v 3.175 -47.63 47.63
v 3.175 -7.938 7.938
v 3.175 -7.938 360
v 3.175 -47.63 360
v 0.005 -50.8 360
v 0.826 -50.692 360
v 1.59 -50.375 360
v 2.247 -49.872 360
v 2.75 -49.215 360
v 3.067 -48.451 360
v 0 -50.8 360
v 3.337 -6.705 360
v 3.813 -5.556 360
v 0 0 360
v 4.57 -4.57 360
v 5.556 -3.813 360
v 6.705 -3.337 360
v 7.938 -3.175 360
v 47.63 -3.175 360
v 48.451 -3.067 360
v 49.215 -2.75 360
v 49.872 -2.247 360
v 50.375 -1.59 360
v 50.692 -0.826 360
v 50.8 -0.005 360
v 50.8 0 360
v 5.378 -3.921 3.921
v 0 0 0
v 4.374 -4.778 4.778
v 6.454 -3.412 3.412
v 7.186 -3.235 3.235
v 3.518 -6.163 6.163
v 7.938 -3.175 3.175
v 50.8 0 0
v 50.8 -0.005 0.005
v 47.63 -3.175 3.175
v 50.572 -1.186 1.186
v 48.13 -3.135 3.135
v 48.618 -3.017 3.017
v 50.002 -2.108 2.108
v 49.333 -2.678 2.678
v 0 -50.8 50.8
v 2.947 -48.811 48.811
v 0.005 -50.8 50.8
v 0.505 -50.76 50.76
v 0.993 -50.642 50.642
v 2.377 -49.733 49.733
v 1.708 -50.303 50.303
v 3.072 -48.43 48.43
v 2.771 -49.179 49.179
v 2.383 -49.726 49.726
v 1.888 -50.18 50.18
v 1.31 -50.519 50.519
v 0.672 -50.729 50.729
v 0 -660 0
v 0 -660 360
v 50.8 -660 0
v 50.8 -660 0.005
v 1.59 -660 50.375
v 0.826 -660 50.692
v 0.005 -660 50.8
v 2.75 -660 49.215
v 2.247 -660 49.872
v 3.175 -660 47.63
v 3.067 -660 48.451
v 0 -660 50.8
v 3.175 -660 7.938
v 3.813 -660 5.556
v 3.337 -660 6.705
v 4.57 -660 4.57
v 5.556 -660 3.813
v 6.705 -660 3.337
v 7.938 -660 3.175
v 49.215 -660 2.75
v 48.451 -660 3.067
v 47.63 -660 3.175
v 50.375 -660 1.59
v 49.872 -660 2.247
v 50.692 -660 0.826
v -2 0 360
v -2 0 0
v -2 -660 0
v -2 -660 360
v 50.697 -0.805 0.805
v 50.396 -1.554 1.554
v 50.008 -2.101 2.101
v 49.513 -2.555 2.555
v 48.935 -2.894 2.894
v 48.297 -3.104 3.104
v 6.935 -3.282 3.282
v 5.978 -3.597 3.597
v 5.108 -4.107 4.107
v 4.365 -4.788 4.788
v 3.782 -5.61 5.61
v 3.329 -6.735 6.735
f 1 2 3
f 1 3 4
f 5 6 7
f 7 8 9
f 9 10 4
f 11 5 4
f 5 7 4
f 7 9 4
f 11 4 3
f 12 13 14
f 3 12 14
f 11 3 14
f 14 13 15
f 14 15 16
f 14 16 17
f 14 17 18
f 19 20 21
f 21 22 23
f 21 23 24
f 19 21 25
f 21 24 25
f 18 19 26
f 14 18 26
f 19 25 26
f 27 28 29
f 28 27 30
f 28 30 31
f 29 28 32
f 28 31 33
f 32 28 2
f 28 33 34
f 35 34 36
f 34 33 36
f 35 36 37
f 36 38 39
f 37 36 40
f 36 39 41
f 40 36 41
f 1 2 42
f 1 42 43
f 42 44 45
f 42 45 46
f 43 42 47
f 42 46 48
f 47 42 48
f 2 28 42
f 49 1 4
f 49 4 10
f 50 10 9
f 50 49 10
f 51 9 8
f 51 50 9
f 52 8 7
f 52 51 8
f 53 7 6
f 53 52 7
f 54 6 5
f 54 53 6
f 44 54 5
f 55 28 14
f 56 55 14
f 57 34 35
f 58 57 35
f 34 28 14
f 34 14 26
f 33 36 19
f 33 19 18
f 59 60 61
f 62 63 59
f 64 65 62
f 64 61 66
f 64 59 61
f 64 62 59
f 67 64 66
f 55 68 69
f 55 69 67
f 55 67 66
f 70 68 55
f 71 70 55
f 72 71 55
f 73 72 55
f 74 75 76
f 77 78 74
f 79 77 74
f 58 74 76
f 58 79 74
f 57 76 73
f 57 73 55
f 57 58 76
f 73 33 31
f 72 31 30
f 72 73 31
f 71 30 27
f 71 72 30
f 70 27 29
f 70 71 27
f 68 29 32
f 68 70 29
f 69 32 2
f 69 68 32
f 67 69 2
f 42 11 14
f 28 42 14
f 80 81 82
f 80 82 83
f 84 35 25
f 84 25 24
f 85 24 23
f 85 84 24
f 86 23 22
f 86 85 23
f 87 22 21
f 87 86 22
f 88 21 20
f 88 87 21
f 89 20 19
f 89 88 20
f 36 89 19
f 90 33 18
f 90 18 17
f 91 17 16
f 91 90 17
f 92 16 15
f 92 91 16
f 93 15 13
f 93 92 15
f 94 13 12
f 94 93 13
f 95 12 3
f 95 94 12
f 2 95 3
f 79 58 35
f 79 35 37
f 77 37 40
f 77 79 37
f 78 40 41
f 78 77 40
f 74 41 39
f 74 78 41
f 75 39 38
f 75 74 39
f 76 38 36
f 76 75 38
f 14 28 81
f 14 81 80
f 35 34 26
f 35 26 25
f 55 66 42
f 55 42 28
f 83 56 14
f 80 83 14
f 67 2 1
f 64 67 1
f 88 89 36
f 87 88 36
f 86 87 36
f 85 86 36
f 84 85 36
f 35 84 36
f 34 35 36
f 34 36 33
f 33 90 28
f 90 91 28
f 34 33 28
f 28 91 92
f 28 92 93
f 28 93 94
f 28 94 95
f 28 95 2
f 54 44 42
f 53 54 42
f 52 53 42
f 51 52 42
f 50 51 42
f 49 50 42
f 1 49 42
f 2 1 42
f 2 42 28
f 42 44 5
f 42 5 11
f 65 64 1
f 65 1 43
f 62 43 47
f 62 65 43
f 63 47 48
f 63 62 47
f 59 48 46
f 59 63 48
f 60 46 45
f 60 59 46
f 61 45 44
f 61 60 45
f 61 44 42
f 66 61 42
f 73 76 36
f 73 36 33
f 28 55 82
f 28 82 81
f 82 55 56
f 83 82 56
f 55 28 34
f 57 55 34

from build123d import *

# Parameters (mm, degrees)
HIERRO_ANGULAR_2_X_2_X_0_125_1_DEPTH        = 732.842048969
HIERRO_ANGULAR_2_X_2_X_0_125_1_2_DEPTH      = 360
HIERRO_ANGULAR_2_X_2_X_0_125_1_2_DEPTH_BACK = 72.842048969
CROQUIS2_W                                  = 360
CROQUIS2_H                                  = 660
SALIENTE_EXTRUIR1_DEPTH                     = 2


with BuildPart() as part:
    # Sketch1 on segment 1 (carried to segment 1) → Hierro angular 2 X 2 X 0.125(1) (new body)
    with BuildSketch(Plane.ZX.offset(-660)):
        with BuildLine():
            Line((0, 0), (0, 50.8))
            Line((0, 50.8), (0.00508, 50.8))
            ThreePointArc((0.00508, 50.8), (2.246551928, 49.871551928), (3.175, 47.63008))
            Line((3.175, 47.63008), (3.175, 7.9375))
            ThreePointArc((3.175, 7.9375), (4.569903955, 4.569903955), (7.9375, 3.175))
            Line((7.9375, 3.175), (47.63008, 3.175))
            ThreePointArc((47.63008, 3.175), (49.871551928, 2.246551928), (50.8, 0.00508))
            Line((50.8, 0.00508), (50.8, 0))
            Line((50.8, 0), (0, 0))
        make_face()
    extrude(amount=HIERRO_ANGULAR_2_X_2_X_0_125_1_DEPTH)

    # Hierro angular 2 X 2 X 0.125(1) mitre 1
    split(bisect_by=Plane(origin=(0, 0, 0), x_dir=(1, 0, 0), z_dir=(0, -0.707106781, -0.707106781)), keep=Keep.TOP)


with BuildPart() as body_2:
    # Sketch1 → Hierro angular 2 X 2 X 0.125_1 2 (new, two sides: drawn at the far end of the back side and taken through both)
    with BuildSketch(Plane(origin=(0, 0, 0), x_dir=(0, -1, 0), z_dir=(0, 0, 1)).offset(-HIERRO_ANGULAR_2_X_2_X_0_125_1_2_DEPTH_BACK)):
        with BuildLine():
            Line((0, 0), (0, 50.8))
            Line((0, 50.8), (0.00508, 50.8))
            ThreePointArc((0.00508, 50.8), (2.246551928, 49.871551928), (3.175, 47.63008))
            Line((3.175, 47.63008), (3.175, 7.9375))
            ThreePointArc((3.175, 7.9375), (4.569903955, 4.569903955), (7.9375, 3.175))
            Line((7.9375, 3.175), (47.63008, 3.175))
            ThreePointArc((47.63008, 3.175), (49.871551928, 2.246551928), (50.8, 0.00508))
            Line((50.8, 0.00508), (50.8, 0))
            Line((50.8, 0), (0, 0))
        make_face()
    extrude(amount=HIERRO_ANGULAR_2_X_2_X_0_125_1_2_DEPTH + HIERRO_ANGULAR_2_X_2_X_0_125_1_2_DEPTH_BACK)

    # Hierro angular 2 X 2 X 0.125_1 2 mitre 1
    split(bisect_by=Plane(origin=(0, 0, 0), x_dir=(-1, 0, 0), z_dir=(0, 0.707106781, 0.707106781)), keep=Keep.TOP)


with BuildPart() as body_3:
    # Croquis2 → Saliente-Extruir1 (new body)
    with BuildSketch(Plane.ZY):
        with Locations((180, -330)):
            Rectangle(CROQUIS2_W, CROQUIS2_H)
    extrude(amount=SALIENTE_EXTRUIR1_DEPTH)


solid = Compound([part.part, body_2.part, body_3.part])
